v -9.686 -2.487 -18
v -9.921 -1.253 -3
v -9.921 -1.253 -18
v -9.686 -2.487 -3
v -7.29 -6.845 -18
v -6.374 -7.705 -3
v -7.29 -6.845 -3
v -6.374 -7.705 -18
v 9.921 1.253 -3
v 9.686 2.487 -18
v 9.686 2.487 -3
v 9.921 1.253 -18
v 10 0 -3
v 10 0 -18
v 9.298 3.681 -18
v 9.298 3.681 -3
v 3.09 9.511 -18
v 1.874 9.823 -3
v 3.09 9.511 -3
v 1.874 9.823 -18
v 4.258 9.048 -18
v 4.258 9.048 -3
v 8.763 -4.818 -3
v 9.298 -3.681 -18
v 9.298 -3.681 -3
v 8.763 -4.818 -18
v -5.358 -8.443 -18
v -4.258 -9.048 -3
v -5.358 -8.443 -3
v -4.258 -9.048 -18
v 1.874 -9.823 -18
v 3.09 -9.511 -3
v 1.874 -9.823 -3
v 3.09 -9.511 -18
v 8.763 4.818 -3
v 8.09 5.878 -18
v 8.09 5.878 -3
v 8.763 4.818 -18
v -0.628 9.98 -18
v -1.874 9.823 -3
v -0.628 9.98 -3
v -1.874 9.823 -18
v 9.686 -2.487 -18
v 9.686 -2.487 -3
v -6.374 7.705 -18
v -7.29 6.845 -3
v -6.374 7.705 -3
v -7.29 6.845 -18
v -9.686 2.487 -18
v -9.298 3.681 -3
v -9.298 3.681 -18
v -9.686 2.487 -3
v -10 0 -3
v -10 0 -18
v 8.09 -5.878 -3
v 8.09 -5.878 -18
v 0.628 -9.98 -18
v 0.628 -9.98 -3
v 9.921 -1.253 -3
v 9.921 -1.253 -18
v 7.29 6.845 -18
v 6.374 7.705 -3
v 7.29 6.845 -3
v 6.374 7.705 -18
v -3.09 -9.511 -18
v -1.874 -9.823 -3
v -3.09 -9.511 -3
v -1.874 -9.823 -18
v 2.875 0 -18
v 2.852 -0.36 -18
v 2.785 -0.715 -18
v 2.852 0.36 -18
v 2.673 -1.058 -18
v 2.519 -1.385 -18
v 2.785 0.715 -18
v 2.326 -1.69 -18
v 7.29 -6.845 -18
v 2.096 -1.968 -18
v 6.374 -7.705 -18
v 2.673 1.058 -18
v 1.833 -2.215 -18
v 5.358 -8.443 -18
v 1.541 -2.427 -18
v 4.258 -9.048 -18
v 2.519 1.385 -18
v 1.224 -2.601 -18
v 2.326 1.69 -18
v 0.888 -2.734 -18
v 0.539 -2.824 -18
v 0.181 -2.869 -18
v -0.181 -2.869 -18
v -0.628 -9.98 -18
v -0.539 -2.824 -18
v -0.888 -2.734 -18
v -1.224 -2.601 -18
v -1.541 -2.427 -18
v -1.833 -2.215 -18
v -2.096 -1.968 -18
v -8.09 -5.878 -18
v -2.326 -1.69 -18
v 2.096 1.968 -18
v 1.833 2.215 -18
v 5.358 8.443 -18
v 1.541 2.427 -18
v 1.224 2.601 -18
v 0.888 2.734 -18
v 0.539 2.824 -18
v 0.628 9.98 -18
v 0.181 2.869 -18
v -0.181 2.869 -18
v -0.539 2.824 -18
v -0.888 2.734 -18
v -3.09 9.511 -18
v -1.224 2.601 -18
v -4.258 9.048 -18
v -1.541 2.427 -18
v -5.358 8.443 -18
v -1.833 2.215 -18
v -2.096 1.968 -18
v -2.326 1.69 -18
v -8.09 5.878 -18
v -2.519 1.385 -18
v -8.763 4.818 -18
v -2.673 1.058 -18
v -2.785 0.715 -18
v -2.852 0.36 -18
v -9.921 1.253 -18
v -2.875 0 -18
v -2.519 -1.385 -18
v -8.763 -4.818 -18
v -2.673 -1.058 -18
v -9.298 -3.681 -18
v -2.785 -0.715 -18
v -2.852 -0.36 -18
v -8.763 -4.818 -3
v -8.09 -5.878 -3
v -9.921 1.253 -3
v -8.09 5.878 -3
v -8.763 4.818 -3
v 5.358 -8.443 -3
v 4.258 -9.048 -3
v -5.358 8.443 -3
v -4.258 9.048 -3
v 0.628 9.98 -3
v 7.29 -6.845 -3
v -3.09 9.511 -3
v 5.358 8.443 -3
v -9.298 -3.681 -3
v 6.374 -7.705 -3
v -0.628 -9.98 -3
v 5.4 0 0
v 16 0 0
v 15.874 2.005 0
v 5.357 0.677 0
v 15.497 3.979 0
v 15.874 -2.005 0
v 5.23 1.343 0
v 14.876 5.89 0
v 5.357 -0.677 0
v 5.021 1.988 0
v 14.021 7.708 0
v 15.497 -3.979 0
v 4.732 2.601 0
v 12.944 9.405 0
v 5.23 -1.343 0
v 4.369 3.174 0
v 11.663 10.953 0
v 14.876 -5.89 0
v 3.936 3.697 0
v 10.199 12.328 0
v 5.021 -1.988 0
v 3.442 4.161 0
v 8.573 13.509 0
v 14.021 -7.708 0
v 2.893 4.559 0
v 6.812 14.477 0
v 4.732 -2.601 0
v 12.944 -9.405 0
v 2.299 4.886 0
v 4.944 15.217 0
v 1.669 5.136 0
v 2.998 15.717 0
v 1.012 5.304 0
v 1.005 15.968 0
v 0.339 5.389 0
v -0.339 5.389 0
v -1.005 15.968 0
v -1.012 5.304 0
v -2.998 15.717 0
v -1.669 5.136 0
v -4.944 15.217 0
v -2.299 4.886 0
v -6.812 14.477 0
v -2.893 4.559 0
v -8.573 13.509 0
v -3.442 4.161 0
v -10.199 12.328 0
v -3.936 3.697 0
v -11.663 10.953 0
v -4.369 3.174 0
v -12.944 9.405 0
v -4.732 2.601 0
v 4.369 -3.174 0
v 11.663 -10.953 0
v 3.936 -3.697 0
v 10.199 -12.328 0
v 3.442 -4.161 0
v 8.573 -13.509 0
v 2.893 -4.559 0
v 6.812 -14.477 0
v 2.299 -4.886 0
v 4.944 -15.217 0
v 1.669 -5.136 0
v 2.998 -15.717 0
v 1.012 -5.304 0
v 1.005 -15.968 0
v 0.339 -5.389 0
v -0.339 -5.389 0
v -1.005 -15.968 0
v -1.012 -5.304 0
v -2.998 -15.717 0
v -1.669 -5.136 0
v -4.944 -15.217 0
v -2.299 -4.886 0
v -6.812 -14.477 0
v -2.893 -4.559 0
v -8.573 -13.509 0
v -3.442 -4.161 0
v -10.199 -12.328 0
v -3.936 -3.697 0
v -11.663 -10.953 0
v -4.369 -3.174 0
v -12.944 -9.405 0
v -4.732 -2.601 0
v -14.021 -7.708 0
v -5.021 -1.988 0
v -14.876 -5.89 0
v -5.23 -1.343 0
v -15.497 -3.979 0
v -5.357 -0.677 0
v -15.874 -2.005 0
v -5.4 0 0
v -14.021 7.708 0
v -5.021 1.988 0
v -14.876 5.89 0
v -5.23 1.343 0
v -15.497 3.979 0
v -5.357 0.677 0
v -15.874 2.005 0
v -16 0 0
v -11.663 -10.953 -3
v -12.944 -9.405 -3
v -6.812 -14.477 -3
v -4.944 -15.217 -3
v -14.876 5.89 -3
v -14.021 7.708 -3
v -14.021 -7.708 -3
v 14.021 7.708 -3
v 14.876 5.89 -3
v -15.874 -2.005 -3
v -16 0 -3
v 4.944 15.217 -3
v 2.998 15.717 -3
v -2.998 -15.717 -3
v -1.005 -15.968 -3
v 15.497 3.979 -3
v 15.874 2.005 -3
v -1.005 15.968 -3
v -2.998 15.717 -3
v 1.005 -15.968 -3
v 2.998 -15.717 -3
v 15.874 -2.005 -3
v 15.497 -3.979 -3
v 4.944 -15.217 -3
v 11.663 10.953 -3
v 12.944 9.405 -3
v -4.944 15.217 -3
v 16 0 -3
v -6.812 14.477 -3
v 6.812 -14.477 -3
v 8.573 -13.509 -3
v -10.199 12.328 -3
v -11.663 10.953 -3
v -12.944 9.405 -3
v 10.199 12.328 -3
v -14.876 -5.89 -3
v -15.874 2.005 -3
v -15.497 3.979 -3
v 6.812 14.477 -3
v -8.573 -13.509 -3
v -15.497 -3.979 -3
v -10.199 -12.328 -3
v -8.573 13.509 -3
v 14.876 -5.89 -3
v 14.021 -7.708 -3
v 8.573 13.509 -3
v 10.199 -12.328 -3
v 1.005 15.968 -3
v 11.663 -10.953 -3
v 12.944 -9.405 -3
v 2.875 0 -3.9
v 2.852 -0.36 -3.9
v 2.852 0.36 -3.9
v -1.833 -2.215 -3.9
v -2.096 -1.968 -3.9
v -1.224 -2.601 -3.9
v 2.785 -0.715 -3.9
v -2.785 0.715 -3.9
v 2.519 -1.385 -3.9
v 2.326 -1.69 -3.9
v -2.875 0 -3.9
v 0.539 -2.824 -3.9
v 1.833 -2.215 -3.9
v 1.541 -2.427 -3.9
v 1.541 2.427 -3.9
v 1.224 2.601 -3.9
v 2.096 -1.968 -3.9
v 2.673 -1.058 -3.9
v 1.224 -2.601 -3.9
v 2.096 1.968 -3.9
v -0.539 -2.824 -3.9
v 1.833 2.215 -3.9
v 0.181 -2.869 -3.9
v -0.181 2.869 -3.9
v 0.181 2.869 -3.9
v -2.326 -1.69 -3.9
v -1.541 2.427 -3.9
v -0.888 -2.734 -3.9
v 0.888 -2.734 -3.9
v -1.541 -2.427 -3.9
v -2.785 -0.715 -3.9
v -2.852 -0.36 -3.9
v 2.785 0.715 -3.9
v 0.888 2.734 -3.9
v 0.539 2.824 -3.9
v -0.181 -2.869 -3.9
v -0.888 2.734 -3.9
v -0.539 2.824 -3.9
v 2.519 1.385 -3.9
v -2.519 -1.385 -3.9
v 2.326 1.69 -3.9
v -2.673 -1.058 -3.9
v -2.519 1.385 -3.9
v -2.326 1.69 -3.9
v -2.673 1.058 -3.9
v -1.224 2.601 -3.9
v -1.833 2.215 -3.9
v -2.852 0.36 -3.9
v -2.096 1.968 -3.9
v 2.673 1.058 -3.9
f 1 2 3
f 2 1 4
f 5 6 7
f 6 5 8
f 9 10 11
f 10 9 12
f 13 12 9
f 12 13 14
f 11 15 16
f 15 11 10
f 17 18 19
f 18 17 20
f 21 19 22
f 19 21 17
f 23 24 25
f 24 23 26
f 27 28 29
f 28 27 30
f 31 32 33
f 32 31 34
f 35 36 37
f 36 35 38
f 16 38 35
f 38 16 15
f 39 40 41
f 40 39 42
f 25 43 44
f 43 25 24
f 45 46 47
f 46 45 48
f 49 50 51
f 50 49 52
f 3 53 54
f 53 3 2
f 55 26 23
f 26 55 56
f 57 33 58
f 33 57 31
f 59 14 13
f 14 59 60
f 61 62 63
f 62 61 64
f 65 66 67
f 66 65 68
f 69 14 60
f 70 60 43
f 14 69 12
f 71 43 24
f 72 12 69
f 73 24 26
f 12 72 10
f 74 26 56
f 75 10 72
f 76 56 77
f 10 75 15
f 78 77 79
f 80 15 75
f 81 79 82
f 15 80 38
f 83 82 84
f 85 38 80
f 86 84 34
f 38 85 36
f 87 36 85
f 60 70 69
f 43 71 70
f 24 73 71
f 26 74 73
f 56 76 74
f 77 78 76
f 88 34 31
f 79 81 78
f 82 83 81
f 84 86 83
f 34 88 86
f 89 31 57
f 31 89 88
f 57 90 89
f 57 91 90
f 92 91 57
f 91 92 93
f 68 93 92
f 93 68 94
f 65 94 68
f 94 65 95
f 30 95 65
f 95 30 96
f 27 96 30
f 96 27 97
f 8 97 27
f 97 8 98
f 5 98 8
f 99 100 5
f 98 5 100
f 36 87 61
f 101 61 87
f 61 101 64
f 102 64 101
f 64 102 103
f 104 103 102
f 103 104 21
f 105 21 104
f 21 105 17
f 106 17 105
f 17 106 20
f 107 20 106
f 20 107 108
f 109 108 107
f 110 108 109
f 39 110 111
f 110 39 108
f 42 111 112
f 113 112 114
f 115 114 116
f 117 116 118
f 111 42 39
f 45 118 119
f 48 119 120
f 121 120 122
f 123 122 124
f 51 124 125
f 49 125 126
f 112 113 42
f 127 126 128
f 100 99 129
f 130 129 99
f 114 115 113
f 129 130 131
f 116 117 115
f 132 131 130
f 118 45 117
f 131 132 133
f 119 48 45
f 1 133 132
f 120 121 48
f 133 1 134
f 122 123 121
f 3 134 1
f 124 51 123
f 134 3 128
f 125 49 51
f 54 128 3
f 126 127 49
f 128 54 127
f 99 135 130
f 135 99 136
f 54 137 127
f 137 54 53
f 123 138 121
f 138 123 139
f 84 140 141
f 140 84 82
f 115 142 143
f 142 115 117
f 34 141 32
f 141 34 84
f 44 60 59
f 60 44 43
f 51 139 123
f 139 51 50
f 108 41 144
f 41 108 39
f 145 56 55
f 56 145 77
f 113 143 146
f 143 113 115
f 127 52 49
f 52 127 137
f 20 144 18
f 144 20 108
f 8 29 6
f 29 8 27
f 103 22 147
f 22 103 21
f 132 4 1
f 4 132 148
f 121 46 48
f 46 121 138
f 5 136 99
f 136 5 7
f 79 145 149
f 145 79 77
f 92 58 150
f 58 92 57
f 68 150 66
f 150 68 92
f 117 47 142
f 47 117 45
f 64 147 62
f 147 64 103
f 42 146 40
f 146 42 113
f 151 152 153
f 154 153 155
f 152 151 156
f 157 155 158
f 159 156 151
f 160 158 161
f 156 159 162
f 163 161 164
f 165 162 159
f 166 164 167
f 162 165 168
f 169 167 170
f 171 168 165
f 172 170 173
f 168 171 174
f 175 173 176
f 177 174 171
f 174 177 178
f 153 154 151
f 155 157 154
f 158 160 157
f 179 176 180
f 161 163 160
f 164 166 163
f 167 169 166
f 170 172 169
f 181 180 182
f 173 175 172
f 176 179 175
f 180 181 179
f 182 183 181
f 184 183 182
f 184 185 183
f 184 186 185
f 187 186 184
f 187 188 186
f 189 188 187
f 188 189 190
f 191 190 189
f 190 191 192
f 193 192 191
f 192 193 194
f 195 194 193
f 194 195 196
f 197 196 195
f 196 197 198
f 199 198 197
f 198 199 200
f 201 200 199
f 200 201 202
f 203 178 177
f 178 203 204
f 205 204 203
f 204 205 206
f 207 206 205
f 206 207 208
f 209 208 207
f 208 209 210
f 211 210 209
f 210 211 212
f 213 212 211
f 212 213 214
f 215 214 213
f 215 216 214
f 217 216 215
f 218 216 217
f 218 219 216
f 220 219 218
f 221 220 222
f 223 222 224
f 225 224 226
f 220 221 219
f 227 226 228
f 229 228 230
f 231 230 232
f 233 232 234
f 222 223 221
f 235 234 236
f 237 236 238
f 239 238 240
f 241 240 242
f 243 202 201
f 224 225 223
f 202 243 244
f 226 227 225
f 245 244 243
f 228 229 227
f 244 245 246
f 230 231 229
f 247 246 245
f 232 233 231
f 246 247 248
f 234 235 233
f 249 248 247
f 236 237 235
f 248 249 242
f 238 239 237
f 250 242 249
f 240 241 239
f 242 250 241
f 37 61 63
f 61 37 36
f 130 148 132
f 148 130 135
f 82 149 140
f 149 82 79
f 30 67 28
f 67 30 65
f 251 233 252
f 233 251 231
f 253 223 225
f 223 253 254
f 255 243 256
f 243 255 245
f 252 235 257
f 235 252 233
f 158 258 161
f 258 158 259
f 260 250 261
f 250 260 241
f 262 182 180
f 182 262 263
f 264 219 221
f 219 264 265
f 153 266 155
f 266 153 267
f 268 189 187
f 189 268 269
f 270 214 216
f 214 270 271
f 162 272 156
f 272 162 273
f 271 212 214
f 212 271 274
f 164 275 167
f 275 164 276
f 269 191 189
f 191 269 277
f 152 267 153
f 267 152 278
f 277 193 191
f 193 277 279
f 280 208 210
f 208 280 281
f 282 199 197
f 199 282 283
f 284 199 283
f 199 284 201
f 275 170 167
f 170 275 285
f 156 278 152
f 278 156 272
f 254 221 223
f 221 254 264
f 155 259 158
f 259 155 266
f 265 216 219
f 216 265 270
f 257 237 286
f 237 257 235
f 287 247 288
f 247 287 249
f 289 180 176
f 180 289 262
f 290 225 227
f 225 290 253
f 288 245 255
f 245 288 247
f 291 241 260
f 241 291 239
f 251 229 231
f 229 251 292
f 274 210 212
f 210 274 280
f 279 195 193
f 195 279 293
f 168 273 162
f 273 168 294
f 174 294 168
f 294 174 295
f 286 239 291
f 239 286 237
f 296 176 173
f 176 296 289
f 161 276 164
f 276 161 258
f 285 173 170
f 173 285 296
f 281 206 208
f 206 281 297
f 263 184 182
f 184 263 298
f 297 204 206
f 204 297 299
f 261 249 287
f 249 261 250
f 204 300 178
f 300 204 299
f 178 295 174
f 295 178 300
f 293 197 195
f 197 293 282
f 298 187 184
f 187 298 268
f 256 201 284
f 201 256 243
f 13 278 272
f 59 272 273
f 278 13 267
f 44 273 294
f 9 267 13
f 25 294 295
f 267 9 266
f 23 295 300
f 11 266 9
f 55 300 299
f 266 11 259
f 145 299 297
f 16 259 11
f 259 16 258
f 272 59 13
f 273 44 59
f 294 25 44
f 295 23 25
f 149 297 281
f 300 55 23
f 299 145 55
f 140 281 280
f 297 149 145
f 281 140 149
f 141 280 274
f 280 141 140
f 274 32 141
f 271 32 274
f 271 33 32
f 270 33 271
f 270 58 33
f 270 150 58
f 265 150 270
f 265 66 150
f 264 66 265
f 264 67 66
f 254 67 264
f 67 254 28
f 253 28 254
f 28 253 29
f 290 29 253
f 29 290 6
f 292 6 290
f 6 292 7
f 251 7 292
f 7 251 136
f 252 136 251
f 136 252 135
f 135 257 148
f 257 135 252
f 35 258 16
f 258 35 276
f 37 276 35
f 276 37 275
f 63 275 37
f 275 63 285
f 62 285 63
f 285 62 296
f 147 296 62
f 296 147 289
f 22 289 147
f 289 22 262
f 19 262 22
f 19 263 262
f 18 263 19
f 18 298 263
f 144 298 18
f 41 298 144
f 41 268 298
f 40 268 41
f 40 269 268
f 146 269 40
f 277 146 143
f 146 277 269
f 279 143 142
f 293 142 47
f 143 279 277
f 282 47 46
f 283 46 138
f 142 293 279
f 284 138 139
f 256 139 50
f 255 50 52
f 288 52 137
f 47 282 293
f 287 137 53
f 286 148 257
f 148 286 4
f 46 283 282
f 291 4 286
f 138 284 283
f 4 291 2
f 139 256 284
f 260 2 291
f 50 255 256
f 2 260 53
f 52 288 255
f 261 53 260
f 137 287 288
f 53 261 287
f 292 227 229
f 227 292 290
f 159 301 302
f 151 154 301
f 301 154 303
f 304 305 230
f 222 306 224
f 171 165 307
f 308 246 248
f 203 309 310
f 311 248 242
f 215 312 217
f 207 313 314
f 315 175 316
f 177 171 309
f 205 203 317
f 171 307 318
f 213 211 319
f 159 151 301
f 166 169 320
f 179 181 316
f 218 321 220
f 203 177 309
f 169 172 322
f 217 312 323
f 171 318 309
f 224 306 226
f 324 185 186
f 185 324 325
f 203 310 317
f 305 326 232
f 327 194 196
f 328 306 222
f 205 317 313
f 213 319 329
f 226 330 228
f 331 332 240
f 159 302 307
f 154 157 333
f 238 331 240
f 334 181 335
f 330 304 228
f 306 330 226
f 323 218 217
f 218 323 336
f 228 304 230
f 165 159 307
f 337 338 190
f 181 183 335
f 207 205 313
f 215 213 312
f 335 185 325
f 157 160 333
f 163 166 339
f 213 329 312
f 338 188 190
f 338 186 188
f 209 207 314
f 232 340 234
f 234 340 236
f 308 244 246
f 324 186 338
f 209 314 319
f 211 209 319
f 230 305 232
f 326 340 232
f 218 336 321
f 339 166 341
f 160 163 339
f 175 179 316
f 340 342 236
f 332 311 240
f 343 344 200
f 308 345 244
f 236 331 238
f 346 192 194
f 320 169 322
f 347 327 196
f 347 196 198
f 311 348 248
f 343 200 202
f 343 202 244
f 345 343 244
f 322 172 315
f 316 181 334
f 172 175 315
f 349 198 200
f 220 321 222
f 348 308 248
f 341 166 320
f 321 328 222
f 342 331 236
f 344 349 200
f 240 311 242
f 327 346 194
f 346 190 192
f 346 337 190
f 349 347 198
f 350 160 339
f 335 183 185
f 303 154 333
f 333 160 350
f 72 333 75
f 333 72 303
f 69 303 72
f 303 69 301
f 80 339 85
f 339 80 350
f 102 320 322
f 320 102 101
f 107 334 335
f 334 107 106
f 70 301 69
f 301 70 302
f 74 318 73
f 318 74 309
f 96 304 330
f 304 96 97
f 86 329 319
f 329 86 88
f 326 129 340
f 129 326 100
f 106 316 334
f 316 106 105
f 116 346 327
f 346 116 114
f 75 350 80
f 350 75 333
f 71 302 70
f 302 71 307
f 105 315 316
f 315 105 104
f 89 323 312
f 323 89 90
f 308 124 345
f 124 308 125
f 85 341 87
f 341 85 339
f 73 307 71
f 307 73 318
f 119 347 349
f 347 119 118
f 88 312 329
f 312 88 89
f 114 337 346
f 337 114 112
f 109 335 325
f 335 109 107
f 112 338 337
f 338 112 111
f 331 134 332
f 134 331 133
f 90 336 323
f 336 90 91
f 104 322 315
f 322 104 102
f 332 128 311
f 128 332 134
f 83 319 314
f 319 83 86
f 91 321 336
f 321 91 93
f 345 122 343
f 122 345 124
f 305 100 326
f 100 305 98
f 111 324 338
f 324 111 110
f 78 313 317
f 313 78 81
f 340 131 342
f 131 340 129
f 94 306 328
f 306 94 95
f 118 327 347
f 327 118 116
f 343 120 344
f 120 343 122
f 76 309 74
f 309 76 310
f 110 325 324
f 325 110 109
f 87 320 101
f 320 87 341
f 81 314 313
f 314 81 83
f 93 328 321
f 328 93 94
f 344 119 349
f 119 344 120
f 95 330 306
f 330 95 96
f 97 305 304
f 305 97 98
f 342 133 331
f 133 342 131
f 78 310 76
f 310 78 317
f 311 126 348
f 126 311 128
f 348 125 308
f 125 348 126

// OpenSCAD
$fn = 50;


difference() {
	union() {
		translate(v = [0, 0, -18.0000000000]) {
			cylinder(h = 18, r = 10.0000000000);
		}
		translate(v = [0, 0, -3.0000000000]) {
			cylinder(h = 3, r = 16.0000000000);
		}
	}
	union() {
		translate(v = [0, 0, 0]) {
			rotate(a = [0, 0, 0]) {
				difference() {
					union() {
						#translate(v = [0, 0, -18.0000000000]) {
							cylinder(h = 18, r = 2.6000000000);
						}
						#translate(v = [0, 0, -3.9000000000]) {
							cylinder(h = 3.9000000000, r1 = 2.8750000000, r2 = 5.4000000000);
						}
						#translate(v = [0, 0, -18.0000000000]) {
							cylinder(h = 18, r = 2.8750000000);
						}
						#translate(v = [0, 0, -18.0000000000]) {
							cylinder(h = 18, r = 2.6000000000);
						}
					}
					union();
				}
			}
		}
	}
}
